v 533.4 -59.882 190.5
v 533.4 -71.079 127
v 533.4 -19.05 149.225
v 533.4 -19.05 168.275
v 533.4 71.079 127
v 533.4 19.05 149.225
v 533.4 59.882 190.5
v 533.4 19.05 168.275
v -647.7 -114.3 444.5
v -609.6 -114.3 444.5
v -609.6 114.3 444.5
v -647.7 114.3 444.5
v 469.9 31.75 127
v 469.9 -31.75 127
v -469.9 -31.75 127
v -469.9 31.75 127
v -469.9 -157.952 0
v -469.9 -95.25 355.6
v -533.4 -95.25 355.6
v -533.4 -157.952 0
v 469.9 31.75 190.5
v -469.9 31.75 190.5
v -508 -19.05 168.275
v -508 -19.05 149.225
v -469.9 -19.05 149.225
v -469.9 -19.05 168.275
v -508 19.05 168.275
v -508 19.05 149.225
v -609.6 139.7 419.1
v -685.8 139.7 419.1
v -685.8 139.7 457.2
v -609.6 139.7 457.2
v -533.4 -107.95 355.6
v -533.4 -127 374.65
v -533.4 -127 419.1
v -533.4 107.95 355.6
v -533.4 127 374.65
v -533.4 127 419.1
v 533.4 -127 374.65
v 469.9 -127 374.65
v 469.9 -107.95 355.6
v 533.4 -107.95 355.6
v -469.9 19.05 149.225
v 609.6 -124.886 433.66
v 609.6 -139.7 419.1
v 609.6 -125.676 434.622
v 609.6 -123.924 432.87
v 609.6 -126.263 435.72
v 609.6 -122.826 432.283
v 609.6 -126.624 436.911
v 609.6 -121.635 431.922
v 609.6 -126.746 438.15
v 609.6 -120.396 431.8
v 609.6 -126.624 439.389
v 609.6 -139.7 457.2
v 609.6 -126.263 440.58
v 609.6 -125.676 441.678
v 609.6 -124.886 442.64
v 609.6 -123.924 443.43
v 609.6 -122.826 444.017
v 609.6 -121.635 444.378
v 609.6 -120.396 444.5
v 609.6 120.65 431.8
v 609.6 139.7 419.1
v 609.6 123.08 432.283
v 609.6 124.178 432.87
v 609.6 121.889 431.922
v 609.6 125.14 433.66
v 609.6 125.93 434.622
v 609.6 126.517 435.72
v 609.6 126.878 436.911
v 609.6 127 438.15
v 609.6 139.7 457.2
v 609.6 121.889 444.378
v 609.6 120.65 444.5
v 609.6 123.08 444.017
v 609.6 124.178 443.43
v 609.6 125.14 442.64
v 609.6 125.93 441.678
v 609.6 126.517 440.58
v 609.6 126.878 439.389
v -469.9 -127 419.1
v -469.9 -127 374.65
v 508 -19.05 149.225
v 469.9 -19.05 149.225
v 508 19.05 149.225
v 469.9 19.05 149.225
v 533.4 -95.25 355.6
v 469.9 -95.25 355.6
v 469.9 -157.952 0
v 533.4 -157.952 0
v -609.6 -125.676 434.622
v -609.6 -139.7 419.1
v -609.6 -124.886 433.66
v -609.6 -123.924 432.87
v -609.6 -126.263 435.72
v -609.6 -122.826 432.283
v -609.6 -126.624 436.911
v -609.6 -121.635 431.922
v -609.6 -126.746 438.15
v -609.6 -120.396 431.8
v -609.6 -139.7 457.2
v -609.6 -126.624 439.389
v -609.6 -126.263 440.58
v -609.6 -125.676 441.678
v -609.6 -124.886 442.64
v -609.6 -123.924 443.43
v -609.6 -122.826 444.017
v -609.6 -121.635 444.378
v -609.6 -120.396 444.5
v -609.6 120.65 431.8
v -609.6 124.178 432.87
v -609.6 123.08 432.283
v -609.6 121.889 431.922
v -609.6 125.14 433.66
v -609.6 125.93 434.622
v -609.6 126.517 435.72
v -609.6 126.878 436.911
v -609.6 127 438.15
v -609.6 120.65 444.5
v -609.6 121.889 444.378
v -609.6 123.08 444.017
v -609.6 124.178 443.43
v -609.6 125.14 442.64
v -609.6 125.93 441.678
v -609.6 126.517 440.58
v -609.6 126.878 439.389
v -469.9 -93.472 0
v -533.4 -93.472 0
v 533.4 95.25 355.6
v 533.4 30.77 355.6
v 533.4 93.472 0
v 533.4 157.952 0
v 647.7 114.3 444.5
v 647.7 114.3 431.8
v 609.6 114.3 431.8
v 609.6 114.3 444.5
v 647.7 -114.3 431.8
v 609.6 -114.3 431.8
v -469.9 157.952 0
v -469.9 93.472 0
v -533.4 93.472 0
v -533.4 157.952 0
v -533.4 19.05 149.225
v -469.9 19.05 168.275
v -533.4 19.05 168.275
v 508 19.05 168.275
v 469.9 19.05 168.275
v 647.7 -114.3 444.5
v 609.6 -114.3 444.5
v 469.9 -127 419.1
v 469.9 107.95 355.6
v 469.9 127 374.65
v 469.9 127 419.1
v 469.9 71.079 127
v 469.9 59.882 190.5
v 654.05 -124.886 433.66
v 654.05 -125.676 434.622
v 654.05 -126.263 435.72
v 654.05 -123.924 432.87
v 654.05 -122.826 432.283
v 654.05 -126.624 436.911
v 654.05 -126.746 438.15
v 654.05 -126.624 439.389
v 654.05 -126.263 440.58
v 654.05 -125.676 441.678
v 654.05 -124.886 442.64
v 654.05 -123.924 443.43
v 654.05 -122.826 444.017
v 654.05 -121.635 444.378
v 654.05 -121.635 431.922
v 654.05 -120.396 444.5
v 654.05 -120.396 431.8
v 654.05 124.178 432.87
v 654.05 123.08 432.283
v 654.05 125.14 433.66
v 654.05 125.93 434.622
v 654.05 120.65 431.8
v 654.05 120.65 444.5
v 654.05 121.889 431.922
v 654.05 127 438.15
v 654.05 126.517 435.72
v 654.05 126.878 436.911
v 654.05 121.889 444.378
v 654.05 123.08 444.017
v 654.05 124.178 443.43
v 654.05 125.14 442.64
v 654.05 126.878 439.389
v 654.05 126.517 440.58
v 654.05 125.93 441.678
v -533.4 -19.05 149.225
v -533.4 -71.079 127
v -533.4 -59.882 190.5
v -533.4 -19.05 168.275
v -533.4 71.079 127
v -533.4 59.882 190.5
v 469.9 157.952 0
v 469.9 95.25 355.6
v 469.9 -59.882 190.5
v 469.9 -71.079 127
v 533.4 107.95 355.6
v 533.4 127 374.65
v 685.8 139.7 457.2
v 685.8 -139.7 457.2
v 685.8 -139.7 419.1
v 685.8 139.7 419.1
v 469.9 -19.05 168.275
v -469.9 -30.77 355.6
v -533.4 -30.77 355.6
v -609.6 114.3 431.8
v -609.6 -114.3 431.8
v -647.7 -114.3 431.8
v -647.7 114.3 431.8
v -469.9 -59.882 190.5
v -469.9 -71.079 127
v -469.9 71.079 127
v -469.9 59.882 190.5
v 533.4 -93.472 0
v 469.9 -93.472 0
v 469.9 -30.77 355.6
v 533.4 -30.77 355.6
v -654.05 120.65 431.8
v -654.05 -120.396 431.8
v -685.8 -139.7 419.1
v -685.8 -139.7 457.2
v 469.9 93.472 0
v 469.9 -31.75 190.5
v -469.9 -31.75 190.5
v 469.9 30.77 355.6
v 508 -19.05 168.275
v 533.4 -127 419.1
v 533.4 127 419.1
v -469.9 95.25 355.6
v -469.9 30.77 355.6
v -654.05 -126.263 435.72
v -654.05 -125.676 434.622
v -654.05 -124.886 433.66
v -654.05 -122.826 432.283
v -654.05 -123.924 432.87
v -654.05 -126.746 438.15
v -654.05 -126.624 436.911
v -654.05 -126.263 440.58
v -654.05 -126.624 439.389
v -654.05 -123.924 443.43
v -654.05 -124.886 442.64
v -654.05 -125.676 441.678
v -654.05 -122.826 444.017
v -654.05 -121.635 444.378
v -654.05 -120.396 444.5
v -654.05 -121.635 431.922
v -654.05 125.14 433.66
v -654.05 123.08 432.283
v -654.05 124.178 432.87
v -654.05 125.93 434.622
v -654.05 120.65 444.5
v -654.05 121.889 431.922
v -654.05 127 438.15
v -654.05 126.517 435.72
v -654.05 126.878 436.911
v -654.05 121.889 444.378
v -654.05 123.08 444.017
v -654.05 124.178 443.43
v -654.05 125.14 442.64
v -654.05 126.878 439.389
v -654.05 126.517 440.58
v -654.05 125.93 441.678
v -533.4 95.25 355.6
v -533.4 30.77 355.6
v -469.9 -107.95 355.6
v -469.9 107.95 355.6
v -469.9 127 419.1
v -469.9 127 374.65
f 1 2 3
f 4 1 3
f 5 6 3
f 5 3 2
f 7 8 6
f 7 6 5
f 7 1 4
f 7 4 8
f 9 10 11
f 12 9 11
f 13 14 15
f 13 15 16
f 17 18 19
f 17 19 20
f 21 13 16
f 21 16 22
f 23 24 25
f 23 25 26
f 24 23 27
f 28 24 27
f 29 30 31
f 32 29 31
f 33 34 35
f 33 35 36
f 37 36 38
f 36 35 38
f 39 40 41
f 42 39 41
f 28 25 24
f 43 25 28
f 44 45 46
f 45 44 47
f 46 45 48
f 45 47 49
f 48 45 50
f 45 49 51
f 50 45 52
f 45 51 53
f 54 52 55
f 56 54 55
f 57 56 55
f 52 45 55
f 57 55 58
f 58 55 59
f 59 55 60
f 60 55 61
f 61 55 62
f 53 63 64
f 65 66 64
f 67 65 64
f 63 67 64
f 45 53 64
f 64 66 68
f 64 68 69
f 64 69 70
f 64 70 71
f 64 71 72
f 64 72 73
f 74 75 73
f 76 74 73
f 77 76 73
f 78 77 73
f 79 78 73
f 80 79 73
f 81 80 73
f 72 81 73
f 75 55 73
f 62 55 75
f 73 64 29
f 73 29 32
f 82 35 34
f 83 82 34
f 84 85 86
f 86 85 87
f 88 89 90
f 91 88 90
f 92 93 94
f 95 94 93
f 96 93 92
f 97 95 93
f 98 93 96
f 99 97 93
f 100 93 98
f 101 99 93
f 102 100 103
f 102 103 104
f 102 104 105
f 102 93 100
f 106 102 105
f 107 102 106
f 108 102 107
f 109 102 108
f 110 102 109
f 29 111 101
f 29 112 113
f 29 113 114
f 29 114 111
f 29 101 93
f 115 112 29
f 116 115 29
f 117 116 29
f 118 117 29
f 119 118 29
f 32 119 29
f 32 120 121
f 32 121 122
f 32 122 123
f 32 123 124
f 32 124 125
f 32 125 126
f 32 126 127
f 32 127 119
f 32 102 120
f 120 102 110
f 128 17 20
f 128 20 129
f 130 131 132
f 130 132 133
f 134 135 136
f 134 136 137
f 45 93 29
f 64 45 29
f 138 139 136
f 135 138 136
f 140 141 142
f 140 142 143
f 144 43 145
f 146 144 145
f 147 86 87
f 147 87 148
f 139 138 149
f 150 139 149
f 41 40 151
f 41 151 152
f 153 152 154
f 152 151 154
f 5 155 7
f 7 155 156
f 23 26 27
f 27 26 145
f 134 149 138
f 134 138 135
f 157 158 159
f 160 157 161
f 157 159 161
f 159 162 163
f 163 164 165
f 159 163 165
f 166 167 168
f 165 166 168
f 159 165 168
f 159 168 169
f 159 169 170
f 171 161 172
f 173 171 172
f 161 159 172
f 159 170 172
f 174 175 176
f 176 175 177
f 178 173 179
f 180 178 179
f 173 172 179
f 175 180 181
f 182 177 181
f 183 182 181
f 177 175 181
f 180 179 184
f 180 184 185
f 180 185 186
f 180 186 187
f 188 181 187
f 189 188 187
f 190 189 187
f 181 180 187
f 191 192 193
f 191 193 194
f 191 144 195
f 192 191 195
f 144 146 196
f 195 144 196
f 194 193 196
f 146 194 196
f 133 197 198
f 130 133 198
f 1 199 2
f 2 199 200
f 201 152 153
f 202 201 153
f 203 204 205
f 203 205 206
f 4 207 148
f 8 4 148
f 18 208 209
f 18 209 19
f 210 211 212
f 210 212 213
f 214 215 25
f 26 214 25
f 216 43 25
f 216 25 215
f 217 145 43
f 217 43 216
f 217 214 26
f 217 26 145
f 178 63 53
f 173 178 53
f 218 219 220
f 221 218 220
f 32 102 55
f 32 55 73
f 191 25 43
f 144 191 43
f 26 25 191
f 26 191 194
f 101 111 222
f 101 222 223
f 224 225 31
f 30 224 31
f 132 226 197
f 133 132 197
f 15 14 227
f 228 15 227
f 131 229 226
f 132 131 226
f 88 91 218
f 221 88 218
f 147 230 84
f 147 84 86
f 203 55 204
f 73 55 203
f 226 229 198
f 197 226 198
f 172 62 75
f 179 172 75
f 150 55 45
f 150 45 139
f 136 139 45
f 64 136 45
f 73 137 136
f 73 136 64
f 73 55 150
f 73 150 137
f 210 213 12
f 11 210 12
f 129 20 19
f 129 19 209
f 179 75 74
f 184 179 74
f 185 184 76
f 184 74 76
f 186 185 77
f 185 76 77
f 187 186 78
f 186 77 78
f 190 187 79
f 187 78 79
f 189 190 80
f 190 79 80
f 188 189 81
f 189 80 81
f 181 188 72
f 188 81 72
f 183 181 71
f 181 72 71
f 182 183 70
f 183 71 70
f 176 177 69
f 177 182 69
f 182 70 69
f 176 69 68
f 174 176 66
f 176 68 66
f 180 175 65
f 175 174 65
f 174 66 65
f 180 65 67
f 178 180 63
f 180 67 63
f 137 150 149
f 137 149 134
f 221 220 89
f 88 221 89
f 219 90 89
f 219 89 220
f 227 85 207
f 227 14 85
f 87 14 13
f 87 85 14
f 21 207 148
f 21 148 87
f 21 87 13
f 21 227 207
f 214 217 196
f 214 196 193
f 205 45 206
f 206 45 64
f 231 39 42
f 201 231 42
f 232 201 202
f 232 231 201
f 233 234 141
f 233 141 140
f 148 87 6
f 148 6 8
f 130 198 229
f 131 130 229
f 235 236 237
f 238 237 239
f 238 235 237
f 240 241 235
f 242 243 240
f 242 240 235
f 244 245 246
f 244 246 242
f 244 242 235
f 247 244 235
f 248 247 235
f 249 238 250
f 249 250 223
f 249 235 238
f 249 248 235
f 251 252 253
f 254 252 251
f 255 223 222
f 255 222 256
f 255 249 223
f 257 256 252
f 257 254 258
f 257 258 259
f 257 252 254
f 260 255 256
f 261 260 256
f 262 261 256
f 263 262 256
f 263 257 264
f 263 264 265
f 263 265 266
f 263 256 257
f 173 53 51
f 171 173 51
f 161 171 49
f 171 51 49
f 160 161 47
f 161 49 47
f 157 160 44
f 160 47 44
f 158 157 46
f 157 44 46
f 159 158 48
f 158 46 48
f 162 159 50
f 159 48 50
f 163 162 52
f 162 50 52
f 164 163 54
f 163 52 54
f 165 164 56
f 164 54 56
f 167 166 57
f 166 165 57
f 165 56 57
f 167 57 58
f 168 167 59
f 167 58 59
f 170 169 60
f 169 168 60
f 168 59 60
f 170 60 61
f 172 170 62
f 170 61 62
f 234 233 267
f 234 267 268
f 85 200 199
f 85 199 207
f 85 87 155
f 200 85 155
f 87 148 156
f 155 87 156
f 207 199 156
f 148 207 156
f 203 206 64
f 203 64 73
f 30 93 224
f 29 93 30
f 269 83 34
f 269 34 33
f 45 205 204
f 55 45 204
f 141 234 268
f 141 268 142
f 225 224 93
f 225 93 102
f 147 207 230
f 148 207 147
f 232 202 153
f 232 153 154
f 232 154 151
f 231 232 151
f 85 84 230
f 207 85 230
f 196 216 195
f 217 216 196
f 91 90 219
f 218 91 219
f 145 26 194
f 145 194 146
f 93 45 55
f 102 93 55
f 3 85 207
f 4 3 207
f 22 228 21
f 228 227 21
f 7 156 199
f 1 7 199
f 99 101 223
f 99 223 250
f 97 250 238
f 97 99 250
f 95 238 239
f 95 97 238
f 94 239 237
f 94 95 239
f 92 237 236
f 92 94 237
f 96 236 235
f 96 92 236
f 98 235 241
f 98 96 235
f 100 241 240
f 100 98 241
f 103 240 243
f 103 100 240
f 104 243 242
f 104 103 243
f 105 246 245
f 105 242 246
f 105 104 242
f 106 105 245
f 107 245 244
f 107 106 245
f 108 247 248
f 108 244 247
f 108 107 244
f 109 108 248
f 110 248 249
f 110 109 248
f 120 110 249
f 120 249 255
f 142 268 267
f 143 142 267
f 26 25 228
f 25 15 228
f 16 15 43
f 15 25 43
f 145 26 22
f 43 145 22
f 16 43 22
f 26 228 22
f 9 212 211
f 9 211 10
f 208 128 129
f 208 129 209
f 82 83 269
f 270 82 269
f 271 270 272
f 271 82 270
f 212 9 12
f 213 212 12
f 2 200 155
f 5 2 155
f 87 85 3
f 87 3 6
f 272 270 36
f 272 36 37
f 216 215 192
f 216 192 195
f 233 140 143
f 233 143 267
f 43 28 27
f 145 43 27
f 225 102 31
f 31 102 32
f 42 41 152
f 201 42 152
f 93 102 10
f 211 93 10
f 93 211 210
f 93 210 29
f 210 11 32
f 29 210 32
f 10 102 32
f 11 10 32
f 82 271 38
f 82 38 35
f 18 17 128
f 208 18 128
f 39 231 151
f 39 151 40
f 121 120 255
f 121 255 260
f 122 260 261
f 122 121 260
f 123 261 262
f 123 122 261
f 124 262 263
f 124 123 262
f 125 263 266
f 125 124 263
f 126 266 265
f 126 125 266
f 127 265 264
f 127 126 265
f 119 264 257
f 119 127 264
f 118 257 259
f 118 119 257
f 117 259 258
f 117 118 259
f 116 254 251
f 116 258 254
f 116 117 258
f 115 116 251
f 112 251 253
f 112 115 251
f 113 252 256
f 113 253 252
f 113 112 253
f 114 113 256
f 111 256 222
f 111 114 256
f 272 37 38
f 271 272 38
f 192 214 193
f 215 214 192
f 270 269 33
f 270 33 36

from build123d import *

# Parameters (mm, degrees)
F0_W      = 279.4
F0_H      = 38.1
F1_DEPTH  = 609.6
F2_W      = 228.6
F2_H      = 12.7
F3_DEPTH  = 38.1
F4_W      = 279.4
F4_H      = 38.1
F5_DEPTH  = 76.2
F7_START  = 6.35
F7_DEPTH  = 31.75
F9_W      = 63.5
F9_H      = 63.5
F10_DEPTH = 469.9
F11_W     = 38.1
F11_H     = 19.05
F12_DEPTH = 38.1
F15_DEPTH = 63.5
F16_DEPTH = 63.5
F17_DEPTH = 63.5
F14_W     = 63.5
F14_H     = 63.5
F14_W_2   = 38.1
F14_H_2   = 19.05
F18_DEPTH = 63.5


# Not quite as in the source:
# - a pattern or mirror of a feature is missing from the dataset's text; its kind, count and spacing are read off the source's solid


with BuildPart() as f1:
    # F0 (on Right) → F1 (new body, symmetric)
    with BuildSketch(Plane.YZ):
        with Locations((0, 438.15)):
            Rectangle(F0_W, F0_H)
    extrude(amount=F1_DEPTH, both=True)

    # F2 (on face) → F3 (join)
    with BuildSketch(Plane.YZ.offset(609.6)):
        with Locations((0, 438.15)):
            Rectangle(F2_W, F2_H)
    f3 = extrude(amount=F3_DEPTH)

    # F3_copies: F3 across plane
    add(f3.mirror(Plane(origin=(0, 0, 0), x_dir=(0, 0, -1), z_dir=(-1, 0, 0))))


with BuildPart() as f5:
    # F4 (on face) → F5 (new body)
    with BuildSketch(Plane.YZ.offset(609.6)):
        with Locations((0, 438.15)):
            Rectangle(F4_W, F4_H)
        with BuildLine():
            ThreePointArc((-120.396, 431.8), (-126.746, 438.15), (-120.396, 444.5))
            Line((-120.396, 444.5), (120.65, 444.5))
            ThreePointArc((120.65, 444.5), (127, 438.15), (120.65, 431.8))
            Line((120.65, 431.8), (-120.396, 431.8))
        make_face(mode=Mode.SUBTRACT)
    extrude(amount=F5_DEPTH)

    # F6 (on face) → F7 (join)
    with BuildSketch(Plane.YZ.offset(647.7).offset(F7_START)):
        with BuildLine():
            ThreePointArc((-120.396, 444.5), (-126.746, 438.15), (-120.396, 431.8))
            Line((-120.396, 431.8), (120.65, 431.8))
            ThreePointArc((120.65, 431.8), (127, 438.15), (120.65, 444.5))
            Line((120.65, 444.5), (-120.396, 444.5))
        make_face()
    extrude(amount=F7_DEPTH)


with BuildPart() as f8_1:
    # F8: instance of F5
    add(f5.part.mirror(Plane.YZ))


with BuildPart() as f10:
    # F9 (on Right) → F10 (new body, symmetric)
    with BuildSketch(Plane.YZ):
        with Locations((0, 158.75)):
            Rectangle(F9_W, F9_H)
    extrude(amount=F10_DEPTH, both=True)

    # F11 (on face) → F12 (join)
    with BuildSketch(Plane.YZ.offset(469.9)):
        with Locations((0, 158.75)):
            Rectangle(F11_W, F11_H)
    extrude(amount=F12_DEPTH)

    # F13: F10 across plane


with BuildPart() as f10_1:
    add(f10.part)
    add(f10.part.mirror(Plane.YZ))


with BuildPart() as f15:
    # F14 (on face) → F15 (new body)
    with BuildSketch(Plane.YZ.offset(469.9)):
        Polygon((-107.95, 355.6), (-95.25, 355.6), (-30.7704101453, 355.6), (30.7704101453, 355.6), (95.25, 355.6), (107.95, 355.6), (127, 374.65), (127, 419.1), (-127, 419.1), (-127, 374.65), align=None)
    extrude(amount=F15_DEPTH)


with BuildPart() as f16:
    # F14 (on face) → F16 (new body, through all)
    with BuildSketch(Plane.YZ.offset(469.9)):
        Polygon((-95.25, 355.6), (-157.9518743399, 0), (-93.4722844852, 0), (-71.0787579352, 127), (-59.8819946602, 190.5), (-30.7704101453, 355.6), align=None)
    extrude(amount=F16_DEPTH)


with BuildPart() as f17:
    # F14 (on face) → F17 (new body, through all)
    with BuildSketch(Plane.YZ.offset(469.9)):
        Polygon((95.25, 355.6), (30.7704101453, 355.6), (59.8819946602, 190.5), (71.0787579352, 127), (93.4722844852, 0), (157.9518743399, 0), align=None)
    extrude(amount=F17_DEPTH)


with BuildPart() as f18:
    # F14 (on face) → F18 (new body, through all)
    with BuildSketch(Plane.YZ.offset(469.9)):
        Polygon((-59.8819946602, 190.5), (-71.0787579352, 127), (-31.75, 127), (-31.75, 190.5), align=None)
        with Locations((0, 158.75)):
            Rectangle(F14_W, F14_H)
        with Locations((0, 158.75)):
            Rectangle(F14_W_2, F14_H_2, mode=Mode.SUBTRACT)
        Polygon((31.75, 190.5), (31.75, 127), (71.0787579352, 127), (59.8819946602, 190.5), align=None)
    extrude(amount=F18_DEPTH)


with BuildPart() as f19_1:
    # F19: instance of F16
    add(f16.part.mirror(Plane.YZ))


with BuildPart() as f19_2:
    # F19: instance of F15
    add(f15.part.mirror(Plane.YZ))


with BuildPart() as f19_3:
    # F19: instance of F17
    add(f17.part.mirror(Plane.YZ))


with BuildPart() as f19_4:
    # F19: instance of F18
    add(f18.part.mirror(Plane.YZ))


solid = Compound([f1.part, f5.part, f8_1.part, f10_1.part, f15.part, f16.part, f17.part, f18.part, f19_1.part, f19_2.part, f19_3.part, f19_4.part])
